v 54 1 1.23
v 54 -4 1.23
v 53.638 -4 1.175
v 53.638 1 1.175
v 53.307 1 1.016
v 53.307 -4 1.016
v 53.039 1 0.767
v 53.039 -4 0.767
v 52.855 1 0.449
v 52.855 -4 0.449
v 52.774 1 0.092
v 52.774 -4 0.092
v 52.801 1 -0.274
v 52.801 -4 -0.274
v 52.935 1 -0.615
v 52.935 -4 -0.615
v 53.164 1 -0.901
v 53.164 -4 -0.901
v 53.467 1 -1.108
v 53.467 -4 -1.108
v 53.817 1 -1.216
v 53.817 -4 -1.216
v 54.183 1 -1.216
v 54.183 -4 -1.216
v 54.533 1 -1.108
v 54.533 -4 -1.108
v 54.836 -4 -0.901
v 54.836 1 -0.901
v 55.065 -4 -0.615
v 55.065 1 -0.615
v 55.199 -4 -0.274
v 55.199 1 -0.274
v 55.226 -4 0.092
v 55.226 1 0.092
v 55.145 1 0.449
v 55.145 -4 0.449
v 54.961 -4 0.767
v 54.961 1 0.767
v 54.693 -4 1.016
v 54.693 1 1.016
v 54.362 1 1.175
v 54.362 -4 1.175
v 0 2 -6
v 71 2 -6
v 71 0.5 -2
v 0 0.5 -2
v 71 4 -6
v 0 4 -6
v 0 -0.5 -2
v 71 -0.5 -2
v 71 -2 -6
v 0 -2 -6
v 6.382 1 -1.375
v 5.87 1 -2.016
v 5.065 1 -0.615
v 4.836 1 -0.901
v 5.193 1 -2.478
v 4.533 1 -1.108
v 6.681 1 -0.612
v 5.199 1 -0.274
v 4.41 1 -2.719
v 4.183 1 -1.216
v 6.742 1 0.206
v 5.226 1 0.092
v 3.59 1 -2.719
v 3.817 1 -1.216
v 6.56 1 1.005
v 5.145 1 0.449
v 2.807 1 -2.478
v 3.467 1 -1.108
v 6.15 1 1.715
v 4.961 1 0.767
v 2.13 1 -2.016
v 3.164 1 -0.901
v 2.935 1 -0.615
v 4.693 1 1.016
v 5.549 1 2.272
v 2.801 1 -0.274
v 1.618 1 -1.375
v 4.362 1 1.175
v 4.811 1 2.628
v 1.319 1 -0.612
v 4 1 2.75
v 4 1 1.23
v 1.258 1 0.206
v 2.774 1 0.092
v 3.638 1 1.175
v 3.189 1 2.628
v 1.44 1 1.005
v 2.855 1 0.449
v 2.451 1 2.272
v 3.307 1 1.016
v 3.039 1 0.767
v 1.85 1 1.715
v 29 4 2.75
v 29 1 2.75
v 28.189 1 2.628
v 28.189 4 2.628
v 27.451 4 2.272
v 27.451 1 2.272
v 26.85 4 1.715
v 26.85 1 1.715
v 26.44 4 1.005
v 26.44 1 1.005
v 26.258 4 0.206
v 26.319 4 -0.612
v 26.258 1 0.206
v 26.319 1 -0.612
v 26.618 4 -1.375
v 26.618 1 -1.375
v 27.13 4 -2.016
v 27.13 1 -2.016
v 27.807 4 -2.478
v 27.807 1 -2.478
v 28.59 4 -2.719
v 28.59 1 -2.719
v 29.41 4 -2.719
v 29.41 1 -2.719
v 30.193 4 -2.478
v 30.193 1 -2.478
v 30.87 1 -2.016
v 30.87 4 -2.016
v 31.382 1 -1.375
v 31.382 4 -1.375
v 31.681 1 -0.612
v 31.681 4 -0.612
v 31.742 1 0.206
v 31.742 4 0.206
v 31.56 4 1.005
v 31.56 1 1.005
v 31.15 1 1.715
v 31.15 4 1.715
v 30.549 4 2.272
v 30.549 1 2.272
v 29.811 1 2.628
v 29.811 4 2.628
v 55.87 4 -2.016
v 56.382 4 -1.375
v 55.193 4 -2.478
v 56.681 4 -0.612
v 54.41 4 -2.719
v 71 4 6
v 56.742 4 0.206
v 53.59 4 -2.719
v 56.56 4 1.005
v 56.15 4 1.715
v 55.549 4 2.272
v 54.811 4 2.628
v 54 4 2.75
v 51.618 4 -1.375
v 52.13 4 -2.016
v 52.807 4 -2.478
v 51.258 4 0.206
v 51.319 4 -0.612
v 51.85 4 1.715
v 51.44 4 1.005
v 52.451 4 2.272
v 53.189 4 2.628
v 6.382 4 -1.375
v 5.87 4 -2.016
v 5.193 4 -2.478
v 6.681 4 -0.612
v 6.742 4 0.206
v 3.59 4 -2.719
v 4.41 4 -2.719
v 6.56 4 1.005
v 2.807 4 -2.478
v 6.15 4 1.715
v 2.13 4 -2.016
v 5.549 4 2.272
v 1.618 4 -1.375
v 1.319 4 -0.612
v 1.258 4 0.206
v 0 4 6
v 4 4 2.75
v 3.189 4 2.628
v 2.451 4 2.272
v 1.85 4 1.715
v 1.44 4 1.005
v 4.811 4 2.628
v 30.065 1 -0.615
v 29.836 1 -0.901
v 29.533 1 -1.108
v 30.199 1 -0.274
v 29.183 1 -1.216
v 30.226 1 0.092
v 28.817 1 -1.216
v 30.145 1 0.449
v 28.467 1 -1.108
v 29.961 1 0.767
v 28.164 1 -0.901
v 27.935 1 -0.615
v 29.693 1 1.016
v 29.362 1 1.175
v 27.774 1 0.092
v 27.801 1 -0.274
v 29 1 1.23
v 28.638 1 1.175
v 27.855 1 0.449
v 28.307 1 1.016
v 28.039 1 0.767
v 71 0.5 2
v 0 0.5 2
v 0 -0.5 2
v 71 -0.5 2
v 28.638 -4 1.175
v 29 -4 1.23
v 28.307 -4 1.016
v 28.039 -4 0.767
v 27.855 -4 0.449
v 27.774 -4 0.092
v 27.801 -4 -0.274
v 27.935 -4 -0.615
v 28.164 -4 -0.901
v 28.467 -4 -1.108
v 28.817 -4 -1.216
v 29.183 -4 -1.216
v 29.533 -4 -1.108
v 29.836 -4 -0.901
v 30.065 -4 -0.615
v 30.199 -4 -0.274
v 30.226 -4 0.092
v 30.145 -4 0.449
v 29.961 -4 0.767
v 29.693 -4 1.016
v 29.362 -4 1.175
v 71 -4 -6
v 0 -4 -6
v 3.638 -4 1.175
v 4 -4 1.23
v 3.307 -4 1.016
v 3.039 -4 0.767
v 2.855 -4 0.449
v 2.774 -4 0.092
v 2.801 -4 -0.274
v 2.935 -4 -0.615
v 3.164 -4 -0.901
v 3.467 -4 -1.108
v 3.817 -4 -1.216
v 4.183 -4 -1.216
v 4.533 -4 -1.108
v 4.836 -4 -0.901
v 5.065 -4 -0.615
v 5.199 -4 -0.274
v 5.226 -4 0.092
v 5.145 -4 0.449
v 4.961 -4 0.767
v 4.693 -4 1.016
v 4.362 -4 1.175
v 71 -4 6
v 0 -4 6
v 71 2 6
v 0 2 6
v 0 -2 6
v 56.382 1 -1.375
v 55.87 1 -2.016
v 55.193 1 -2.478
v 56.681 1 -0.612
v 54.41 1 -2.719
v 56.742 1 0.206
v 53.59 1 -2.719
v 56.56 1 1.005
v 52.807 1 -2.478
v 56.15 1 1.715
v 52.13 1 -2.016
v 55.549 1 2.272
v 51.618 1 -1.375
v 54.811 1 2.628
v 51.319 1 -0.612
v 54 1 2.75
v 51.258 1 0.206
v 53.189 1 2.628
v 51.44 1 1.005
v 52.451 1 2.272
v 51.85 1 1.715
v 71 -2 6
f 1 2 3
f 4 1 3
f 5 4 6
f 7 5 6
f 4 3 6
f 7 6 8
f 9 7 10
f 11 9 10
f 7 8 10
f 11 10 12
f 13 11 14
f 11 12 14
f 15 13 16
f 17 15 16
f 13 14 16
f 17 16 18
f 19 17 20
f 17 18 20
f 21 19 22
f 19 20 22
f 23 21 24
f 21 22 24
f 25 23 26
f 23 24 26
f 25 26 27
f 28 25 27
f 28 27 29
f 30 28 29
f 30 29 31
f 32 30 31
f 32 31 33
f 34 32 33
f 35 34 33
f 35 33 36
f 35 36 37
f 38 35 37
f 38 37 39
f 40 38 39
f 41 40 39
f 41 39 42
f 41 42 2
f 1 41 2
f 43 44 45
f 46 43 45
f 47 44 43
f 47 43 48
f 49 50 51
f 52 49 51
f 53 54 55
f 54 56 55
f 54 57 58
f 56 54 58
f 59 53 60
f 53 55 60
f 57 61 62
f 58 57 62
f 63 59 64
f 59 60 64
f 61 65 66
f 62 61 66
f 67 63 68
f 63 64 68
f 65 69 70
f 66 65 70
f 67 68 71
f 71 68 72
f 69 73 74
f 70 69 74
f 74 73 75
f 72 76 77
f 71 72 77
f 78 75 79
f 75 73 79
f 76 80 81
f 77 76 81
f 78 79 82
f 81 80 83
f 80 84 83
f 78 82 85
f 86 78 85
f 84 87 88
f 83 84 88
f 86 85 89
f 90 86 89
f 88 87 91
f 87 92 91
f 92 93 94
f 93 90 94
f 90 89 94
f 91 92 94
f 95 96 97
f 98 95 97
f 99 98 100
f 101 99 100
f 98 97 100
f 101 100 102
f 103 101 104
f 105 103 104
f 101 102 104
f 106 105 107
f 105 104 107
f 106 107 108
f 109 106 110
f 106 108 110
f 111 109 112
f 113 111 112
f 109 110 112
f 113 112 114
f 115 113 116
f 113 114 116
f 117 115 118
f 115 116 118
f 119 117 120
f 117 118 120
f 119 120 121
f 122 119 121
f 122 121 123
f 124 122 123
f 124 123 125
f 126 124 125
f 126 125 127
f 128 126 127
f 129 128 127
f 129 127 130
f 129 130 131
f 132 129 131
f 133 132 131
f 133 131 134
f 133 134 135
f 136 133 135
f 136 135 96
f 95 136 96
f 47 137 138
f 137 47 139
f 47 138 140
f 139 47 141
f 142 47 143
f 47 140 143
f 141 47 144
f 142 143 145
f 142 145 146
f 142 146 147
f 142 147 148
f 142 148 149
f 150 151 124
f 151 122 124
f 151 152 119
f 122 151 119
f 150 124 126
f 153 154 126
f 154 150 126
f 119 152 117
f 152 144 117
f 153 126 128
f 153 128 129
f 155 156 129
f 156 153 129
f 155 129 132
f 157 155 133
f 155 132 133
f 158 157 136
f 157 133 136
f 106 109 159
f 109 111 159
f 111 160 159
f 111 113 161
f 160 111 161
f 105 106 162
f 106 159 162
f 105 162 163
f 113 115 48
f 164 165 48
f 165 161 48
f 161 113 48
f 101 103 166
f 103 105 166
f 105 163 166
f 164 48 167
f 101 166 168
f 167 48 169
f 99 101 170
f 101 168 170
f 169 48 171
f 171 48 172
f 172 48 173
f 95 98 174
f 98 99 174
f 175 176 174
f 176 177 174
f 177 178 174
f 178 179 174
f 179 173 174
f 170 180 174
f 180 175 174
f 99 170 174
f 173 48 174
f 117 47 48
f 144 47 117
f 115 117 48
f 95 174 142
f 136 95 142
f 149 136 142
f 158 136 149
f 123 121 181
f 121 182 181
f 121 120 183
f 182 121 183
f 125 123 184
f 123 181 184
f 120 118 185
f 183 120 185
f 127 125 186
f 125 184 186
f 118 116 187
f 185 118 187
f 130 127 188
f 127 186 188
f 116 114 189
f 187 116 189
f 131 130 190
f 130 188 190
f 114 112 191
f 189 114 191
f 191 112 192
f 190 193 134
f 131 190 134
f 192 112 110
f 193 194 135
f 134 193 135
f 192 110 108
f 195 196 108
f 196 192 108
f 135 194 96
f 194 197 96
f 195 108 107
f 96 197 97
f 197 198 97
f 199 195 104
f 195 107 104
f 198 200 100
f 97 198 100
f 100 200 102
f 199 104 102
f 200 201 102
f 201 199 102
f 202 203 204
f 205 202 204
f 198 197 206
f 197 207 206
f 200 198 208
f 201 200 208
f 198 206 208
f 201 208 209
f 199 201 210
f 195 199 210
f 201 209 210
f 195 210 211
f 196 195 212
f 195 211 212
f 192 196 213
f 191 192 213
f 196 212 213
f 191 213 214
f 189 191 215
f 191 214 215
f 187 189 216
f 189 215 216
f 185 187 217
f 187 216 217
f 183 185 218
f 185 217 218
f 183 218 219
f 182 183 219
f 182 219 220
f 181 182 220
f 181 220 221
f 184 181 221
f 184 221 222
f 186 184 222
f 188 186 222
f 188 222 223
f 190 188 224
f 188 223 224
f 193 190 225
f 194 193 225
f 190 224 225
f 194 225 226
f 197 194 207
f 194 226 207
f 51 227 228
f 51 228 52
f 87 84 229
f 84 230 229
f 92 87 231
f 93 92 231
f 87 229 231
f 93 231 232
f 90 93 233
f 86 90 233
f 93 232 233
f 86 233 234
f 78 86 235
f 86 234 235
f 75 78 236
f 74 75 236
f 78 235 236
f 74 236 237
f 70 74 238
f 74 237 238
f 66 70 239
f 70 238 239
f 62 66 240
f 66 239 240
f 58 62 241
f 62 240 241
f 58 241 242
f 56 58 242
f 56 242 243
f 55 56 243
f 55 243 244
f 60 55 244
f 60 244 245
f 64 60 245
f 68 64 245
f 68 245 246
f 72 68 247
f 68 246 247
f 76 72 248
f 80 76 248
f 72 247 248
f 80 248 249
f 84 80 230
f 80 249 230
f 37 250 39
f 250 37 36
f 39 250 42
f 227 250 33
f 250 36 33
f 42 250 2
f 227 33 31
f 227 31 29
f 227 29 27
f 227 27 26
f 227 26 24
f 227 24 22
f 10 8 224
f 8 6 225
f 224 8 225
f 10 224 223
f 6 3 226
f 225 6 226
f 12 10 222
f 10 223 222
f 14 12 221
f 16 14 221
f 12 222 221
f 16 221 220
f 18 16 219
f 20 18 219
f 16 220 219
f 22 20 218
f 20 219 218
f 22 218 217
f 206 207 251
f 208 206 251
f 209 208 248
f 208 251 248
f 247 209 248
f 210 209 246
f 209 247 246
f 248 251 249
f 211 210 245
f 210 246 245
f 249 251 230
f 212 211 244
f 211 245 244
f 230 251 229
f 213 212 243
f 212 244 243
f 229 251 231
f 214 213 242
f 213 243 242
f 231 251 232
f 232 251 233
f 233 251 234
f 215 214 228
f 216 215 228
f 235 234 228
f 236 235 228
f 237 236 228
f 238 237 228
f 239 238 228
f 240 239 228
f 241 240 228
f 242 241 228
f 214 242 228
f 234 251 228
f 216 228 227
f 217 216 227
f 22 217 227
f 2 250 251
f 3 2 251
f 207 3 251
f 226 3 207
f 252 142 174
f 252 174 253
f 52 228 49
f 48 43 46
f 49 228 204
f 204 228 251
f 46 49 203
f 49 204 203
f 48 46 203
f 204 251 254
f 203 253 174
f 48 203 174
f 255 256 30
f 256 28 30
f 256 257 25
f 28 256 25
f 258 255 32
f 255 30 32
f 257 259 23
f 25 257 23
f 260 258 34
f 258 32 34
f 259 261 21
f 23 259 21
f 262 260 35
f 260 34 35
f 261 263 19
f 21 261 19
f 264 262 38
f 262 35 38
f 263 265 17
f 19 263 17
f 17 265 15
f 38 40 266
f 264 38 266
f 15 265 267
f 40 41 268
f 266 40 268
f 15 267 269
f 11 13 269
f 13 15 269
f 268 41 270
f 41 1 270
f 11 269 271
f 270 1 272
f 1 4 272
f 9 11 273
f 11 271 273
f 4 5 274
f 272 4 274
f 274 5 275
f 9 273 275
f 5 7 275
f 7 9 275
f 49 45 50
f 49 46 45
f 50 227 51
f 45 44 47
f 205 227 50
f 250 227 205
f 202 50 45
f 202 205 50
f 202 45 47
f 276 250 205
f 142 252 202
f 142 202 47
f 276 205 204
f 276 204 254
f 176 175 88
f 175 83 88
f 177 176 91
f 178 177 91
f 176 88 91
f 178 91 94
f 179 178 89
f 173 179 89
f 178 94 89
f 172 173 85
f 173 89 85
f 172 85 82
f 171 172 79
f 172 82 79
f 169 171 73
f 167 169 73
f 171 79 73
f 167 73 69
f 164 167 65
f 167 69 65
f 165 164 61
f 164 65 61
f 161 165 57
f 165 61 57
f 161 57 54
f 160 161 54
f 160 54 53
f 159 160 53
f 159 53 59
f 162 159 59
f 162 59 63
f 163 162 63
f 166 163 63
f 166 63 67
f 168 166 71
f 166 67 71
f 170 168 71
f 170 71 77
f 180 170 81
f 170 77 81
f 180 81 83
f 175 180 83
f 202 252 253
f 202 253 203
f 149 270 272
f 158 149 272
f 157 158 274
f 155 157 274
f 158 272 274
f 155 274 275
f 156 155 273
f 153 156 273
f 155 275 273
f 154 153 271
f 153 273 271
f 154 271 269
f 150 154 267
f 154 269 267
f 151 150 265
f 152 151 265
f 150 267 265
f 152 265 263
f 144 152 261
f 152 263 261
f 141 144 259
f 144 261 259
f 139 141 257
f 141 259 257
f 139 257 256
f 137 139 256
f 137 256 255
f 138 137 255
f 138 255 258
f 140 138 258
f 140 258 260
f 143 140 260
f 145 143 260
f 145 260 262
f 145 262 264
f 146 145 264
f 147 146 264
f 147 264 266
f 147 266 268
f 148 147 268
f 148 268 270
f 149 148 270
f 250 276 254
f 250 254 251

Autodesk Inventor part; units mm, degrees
ref_plane "YZ Plane" through (0, 0, 0) normal (1, 0, 0) x (0, 1, 0)
ref_plane "XZ Plane" through (0, 0, 0) normal (0, 1, 0) x (-1, 0, 0)
ref_plane "XY Plane" through (0, 0, 0) normal (0, 0, 1) x (1, 0, 0)
sketch "Sketch1" plane through (0, 0, 0) normal (1, 0, 0) x (0, 1, 0)
  line L0 (-4, 6) -> (-4, -6)
  line L1 (-4, -6) -> (-2, -6)
  line L2 (2, -6) -> (4, -6)
  line L3 (4, -6) -> (4, 6)
  line L4 (4, 6) -> (2, 6)
  line L5 (2, 6) -> (0.5, 2)
  line L6 (0.5, 2) -> (-0.5, 2)
  line L7 (-0.5, 2) -> (-2, 6)
  line L8 (-2, 6) -> (-4, 6)
  line L9 (2, -6) -> (0.5, -2)
  line L10 (0.5, -2) -> (-0.5, -2)
  line L11 (-0.5, -2) -> (-2, -6)
  point P0 (0, 0)
  point P1 (-4, 0)
  point P2 (4, 0)
  point P3 (0, 2)
  point P4 (0, -2)
  dimension "d3" = 8
  dimension "d4" = 12
  dimension "d5" = 4
  dimension "d6" = 2
  dimension "d7" = 2
  dimension "d17" = 2
  dimension "d18" = 2
  dimension "d19" = 1
  dimension "d20" = 1
  dimension "d21" = 4
extrude "Extrusion1" add sketch "Sketch1" along normal blind 71
sketch "Sketch2" plane through (0, 4, 6) normal (0, 1, 0) x (1, 0, 0)
  line L0 (0, 12) -> (0, 0) projected
  point P0 (0, 6)
  point P1 (4, 6)
  point P2 (29, 6)
  point P3 (0, 6)
  point P4 (0, 6)
  point P5 (54, 6)
  dimension "d22" = 4
  dimension "d23" = 25
  dimension "d31" = 25
hole "Hole1" at (4, 4, 0) at (29, 4, 0) at (54, 4, 0) direction (0, -1, 0) diameter 2.459 end through all counterbore diameter 5.5 counterbore depth 3 thread size "M3x0.5" class "6H" standard "ISO Metric profile"
properties part number "lm_guide_rail" material "Stainless Steel"
